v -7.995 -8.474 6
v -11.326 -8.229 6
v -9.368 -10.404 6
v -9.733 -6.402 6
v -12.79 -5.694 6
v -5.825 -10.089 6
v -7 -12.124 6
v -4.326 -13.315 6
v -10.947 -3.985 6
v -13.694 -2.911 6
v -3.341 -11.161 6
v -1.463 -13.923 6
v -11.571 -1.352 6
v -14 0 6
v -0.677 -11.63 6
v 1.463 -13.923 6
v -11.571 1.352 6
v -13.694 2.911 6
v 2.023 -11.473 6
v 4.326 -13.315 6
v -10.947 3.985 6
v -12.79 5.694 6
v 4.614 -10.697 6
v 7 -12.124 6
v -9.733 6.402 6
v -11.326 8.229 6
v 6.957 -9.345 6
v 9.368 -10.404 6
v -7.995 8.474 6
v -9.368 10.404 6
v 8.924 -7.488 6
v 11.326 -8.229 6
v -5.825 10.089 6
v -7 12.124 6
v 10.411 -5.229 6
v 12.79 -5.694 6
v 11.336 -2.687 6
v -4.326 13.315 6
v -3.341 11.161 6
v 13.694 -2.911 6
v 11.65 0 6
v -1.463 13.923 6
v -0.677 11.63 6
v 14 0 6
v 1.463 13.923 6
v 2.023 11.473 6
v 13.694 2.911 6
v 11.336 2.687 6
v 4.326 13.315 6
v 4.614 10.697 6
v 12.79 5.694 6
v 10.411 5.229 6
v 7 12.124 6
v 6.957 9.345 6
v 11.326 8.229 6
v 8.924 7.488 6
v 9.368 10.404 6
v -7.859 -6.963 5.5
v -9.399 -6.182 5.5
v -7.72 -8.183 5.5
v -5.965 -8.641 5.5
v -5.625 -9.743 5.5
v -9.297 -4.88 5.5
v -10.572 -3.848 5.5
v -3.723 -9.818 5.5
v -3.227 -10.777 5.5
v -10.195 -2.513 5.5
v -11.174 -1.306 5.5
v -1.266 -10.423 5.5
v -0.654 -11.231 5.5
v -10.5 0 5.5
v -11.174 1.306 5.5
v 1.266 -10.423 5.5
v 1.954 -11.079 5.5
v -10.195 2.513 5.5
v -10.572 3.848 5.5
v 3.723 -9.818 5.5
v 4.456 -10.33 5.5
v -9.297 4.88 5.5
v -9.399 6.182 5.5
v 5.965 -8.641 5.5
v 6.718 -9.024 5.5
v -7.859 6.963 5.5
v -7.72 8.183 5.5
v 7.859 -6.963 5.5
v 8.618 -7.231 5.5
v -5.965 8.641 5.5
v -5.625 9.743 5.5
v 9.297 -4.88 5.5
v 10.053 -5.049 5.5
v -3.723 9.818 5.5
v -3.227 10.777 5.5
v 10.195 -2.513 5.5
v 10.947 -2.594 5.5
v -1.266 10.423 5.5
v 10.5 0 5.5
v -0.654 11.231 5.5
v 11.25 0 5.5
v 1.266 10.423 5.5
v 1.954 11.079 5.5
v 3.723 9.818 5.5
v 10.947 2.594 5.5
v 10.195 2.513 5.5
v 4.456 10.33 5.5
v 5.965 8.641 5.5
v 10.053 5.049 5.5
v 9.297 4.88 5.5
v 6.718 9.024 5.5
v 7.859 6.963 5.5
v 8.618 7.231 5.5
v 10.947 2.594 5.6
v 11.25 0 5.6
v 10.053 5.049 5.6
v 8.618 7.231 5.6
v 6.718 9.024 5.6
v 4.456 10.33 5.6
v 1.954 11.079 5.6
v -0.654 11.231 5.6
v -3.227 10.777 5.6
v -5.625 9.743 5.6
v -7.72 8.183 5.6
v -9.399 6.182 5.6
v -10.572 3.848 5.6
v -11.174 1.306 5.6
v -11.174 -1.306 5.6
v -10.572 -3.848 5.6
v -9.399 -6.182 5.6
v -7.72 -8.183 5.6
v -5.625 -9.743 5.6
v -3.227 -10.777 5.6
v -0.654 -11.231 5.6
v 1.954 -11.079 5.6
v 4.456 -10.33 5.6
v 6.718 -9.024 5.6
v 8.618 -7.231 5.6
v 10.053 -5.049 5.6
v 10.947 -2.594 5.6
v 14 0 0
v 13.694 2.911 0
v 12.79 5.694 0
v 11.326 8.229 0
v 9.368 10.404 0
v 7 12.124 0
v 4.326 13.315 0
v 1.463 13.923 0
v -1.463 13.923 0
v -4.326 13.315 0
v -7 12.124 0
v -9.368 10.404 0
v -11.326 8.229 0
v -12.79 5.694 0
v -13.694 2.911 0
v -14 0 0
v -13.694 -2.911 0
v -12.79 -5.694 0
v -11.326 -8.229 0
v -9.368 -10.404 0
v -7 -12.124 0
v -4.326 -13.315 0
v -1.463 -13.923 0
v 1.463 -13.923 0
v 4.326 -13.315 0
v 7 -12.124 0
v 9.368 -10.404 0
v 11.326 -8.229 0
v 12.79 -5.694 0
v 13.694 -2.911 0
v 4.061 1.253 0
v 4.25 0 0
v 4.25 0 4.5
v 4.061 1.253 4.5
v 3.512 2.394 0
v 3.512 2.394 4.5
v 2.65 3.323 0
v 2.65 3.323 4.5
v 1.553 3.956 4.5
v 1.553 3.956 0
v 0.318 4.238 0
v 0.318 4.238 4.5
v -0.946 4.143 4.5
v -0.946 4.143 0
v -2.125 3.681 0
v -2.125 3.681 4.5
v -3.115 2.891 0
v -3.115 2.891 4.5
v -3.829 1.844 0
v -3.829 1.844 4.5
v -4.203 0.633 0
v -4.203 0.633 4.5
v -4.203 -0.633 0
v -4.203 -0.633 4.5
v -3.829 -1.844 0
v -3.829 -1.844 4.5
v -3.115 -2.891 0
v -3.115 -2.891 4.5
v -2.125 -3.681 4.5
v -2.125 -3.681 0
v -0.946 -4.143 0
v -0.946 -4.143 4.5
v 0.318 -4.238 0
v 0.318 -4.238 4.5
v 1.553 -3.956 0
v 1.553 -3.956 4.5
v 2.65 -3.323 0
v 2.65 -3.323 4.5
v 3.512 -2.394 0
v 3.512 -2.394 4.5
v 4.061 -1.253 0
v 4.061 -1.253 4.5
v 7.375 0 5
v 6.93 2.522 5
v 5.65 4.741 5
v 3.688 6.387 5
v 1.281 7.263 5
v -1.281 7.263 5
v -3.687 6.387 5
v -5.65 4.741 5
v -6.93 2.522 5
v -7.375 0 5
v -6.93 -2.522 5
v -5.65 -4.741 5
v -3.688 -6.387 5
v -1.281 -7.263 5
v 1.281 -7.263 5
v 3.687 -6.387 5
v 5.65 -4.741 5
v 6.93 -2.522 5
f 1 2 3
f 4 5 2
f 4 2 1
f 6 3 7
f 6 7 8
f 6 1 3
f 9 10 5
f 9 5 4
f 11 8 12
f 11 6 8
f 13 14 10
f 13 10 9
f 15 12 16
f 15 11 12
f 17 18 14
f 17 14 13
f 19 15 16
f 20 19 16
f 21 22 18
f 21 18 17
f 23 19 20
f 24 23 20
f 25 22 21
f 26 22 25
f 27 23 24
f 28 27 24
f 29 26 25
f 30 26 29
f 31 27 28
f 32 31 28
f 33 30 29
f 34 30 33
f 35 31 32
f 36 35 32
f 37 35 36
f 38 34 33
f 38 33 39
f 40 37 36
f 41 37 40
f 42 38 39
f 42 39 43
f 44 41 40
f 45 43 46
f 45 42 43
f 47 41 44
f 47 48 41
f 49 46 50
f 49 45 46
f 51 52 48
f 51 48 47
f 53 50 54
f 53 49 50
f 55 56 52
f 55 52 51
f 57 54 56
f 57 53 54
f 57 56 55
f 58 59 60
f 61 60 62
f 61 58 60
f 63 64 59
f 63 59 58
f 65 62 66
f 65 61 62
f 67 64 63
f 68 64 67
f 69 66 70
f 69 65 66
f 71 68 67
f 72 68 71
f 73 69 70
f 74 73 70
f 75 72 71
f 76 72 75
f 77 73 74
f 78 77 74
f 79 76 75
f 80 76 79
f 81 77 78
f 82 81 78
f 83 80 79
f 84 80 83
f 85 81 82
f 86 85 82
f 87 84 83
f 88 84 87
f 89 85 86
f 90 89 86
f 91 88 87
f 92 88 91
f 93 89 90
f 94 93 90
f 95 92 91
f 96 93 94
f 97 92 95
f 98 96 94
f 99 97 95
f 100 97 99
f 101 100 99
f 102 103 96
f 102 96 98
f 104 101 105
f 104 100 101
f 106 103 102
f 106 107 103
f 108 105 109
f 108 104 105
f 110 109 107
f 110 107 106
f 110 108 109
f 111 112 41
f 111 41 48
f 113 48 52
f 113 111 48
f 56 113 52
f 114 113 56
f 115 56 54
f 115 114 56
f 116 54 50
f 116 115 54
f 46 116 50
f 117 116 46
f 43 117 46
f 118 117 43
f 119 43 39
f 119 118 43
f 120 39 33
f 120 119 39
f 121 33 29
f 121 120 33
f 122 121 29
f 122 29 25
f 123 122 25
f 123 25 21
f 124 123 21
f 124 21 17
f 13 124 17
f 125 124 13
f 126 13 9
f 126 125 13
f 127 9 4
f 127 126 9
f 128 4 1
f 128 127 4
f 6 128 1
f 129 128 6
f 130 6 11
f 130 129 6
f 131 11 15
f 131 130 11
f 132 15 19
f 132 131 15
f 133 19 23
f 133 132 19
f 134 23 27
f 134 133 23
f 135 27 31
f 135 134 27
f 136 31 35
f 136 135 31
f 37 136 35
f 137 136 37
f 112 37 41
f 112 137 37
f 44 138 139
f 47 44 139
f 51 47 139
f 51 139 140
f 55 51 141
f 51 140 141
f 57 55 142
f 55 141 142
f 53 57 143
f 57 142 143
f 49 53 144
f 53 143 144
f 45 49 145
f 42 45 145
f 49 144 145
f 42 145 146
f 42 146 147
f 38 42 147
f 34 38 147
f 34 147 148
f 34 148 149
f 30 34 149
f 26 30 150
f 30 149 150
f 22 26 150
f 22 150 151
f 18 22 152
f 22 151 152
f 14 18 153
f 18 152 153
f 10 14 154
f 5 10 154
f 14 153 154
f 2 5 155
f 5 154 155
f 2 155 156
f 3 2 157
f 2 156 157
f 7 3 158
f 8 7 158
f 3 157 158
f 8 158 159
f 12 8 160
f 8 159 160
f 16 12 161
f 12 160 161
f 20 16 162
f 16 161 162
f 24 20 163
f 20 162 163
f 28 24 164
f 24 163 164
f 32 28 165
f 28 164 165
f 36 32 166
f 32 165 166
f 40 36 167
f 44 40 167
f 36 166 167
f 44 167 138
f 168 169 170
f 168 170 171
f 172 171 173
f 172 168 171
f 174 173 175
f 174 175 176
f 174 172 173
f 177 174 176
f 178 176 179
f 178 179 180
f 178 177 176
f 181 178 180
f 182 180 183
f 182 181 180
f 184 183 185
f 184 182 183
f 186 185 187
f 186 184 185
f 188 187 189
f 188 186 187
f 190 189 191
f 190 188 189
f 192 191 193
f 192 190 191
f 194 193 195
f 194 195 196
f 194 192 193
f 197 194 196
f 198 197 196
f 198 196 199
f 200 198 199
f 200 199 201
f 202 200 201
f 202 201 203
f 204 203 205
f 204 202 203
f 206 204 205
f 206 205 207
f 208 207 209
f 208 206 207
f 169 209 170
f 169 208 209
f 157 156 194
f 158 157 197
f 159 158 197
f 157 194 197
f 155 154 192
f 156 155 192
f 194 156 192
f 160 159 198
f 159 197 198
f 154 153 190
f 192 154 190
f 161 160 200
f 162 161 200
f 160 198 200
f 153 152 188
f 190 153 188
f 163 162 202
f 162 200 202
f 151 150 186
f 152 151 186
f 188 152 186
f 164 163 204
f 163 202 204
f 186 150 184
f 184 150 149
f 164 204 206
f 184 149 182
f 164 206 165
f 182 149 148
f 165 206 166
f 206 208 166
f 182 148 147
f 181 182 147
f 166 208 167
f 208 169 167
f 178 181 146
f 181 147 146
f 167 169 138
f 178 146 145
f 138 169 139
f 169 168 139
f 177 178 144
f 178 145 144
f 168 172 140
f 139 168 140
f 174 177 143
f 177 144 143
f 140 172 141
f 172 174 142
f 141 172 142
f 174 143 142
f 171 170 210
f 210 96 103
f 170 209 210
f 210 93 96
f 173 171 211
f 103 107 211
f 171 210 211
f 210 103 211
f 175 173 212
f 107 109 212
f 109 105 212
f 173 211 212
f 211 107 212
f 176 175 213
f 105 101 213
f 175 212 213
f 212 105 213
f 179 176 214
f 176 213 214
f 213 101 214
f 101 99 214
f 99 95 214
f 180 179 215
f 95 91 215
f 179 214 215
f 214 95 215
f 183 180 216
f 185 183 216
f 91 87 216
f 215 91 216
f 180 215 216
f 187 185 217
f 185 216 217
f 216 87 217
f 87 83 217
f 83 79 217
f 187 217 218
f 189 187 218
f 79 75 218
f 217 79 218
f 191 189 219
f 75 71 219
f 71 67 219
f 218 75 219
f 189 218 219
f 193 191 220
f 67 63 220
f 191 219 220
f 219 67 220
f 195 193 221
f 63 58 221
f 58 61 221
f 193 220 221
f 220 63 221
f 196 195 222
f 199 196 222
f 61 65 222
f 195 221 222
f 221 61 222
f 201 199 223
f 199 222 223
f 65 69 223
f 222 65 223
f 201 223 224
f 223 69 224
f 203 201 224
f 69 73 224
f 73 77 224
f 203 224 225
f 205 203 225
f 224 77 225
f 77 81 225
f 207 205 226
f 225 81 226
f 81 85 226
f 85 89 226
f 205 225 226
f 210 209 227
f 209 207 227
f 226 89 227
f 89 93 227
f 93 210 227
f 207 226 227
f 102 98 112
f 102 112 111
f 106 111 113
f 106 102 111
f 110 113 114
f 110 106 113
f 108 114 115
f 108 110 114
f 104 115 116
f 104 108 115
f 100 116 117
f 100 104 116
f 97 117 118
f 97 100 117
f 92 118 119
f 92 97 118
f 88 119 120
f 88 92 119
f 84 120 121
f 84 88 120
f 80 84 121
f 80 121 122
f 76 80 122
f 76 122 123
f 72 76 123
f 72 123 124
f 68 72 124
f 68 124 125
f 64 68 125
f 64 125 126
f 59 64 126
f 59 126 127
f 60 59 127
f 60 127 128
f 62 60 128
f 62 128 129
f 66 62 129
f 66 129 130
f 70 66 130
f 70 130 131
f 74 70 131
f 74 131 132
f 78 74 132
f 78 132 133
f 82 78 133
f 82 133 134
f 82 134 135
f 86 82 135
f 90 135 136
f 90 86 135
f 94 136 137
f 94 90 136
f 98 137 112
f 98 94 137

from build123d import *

# Parameters (mm, degrees)
F0_R     = 11.25
F0_R_2   = 4.25
F1_DEPTH = 5.5
F2_SIZE2 = 6.25
F2_SIZE  = 1
F0_R_3   = 14
F3_DEPTH = 6
F4_SIZE  = 0.4


with BuildPart() as f1:
    # F0 (on Top) → F1 (new body)
    with BuildSketch(Plane.XY):
        Circle(F0_R)
        Circle(F0_R_2, mode=Mode.SUBTRACT)
    extrude(amount=F1_DEPTH)

    # F2
    f2_edges = [f1.edges().sort_by_distance(p)[0] for p in [
        (-4.25, 0, 5.5),
    ]]
    chamfer(f2_edges, length=F2_SIZE, length2=F2_SIZE2)

    # F0 (on Top) → F3 (join)
    with BuildSketch(Plane.XY):
        Circle(F0_R_3)
        Circle(F0_R, mode=Mode.SUBTRACT)
    extrude(amount=F3_DEPTH)

    # F4
    f4_edges = [f1.edges().sort_by_distance(p)[0] for p in [
        (-11.25, 0, 6),
    ]]
    chamfer(f4_edges, length=F4_SIZE)


solid = f1.part
